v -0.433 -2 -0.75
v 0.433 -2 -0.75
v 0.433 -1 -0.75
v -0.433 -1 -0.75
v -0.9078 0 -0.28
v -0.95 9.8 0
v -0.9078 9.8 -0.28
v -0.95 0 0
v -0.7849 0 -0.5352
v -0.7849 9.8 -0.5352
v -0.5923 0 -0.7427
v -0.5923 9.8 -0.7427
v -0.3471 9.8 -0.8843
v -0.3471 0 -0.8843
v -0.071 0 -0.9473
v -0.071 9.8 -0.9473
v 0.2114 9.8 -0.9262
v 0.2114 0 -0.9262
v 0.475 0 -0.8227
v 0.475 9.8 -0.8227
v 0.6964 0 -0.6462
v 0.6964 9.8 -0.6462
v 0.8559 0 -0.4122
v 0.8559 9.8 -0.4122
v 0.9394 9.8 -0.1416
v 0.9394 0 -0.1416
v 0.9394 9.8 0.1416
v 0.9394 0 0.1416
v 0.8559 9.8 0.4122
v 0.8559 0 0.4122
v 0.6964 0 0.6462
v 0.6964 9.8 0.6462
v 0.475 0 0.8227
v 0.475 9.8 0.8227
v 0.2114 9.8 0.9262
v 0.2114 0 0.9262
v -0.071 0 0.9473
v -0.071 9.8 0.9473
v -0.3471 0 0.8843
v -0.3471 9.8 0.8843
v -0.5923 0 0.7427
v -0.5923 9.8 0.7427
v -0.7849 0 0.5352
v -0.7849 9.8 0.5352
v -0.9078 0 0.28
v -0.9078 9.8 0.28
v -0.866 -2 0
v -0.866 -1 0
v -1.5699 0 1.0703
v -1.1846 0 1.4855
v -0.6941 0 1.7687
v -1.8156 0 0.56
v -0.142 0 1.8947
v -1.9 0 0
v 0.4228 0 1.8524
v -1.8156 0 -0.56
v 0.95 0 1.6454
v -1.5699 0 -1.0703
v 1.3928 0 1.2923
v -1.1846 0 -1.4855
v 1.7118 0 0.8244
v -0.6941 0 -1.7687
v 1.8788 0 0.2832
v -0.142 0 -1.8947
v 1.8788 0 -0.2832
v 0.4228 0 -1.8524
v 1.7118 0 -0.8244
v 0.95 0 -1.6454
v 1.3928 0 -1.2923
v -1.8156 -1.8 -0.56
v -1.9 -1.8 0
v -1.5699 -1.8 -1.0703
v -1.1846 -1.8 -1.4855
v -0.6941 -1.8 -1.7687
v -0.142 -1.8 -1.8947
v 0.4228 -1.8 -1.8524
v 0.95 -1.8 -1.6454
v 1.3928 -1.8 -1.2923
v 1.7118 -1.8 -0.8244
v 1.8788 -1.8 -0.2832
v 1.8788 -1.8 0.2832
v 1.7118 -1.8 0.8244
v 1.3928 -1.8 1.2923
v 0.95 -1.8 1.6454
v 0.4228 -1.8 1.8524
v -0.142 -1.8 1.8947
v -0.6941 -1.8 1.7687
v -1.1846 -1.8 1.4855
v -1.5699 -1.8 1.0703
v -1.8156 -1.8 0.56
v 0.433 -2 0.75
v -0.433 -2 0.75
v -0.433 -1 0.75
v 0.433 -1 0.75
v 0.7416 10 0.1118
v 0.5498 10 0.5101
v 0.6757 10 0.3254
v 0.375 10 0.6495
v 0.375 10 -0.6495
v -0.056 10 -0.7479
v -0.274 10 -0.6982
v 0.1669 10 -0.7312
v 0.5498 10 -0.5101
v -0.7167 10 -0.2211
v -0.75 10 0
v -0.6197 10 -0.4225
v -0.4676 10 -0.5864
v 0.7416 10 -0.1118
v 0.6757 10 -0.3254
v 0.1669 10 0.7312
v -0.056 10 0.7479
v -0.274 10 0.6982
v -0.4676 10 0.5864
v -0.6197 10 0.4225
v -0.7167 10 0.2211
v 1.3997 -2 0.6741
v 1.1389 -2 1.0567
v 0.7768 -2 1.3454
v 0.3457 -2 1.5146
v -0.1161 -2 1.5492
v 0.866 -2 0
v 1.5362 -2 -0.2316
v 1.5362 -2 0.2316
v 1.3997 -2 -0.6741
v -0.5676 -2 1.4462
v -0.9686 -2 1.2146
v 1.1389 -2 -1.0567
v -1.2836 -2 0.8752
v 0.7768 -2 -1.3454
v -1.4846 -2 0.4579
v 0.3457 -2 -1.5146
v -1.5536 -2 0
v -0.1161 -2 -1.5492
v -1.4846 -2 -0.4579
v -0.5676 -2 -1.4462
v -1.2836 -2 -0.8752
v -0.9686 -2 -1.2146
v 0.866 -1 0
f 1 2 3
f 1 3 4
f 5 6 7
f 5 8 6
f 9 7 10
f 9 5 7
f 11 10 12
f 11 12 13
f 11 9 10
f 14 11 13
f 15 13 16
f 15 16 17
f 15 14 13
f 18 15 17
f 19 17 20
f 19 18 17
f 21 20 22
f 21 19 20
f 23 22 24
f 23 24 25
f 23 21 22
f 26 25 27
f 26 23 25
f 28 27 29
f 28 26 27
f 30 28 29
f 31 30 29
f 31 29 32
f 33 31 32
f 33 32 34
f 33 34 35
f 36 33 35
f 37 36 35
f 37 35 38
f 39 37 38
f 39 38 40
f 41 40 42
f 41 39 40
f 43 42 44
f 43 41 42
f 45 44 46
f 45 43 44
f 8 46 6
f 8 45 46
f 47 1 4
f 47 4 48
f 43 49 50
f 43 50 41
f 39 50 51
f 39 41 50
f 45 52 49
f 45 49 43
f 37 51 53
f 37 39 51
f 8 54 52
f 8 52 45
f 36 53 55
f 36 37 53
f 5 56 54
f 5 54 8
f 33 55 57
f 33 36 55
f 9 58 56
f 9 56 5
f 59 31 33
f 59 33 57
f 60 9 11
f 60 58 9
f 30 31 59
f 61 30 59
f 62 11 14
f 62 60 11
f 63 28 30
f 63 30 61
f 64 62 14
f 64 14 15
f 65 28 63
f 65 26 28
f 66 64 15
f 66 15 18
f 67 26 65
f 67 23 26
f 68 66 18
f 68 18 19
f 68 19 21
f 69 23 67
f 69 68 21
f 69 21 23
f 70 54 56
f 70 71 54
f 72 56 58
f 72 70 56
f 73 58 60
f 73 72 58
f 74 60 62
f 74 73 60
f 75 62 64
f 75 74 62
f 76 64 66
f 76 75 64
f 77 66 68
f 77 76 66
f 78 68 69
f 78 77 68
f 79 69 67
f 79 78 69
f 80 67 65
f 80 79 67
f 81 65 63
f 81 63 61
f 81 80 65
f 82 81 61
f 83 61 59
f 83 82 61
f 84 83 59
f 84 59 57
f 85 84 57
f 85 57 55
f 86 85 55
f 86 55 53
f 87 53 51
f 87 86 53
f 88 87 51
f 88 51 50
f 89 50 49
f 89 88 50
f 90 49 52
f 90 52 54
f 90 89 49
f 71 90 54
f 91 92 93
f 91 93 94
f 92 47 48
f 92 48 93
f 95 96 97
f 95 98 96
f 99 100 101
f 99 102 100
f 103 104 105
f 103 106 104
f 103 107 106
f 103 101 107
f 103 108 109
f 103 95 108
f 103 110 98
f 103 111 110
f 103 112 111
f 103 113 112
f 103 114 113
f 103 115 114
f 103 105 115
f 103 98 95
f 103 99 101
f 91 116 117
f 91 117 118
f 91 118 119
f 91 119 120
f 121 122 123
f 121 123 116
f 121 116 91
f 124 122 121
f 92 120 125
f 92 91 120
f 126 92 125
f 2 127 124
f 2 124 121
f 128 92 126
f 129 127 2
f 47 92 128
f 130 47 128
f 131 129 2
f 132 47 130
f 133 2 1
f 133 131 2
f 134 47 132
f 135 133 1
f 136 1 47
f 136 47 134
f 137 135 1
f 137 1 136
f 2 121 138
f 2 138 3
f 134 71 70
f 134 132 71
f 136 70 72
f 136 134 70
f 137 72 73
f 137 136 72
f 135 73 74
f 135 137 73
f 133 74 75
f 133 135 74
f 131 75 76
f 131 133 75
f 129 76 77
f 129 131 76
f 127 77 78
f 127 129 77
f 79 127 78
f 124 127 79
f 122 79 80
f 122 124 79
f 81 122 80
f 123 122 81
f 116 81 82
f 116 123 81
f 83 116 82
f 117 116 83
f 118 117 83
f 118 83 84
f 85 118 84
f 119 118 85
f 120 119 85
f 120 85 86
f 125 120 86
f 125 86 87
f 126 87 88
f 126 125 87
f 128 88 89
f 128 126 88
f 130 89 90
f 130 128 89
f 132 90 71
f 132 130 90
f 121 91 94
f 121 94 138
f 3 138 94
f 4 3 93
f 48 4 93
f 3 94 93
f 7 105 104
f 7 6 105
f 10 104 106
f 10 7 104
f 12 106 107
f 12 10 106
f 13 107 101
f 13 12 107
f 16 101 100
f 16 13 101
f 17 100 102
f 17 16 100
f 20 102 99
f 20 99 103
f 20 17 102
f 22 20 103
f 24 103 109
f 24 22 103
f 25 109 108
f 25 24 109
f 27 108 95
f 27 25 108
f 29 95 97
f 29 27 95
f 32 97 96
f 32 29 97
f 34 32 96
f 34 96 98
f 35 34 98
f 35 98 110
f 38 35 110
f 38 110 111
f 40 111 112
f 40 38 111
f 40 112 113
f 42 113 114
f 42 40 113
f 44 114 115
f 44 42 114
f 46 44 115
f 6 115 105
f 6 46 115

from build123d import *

# Parameters (mm, degrees)
CUT_EXTRUDE1_DEPTH = 1


with BuildPart() as part:
    # Sketch1 → Base-Revolve (revolve)
    with BuildSketch(Plane.XY, mode=Mode.PRIVATE) as base_revolve_sk:
        Polygon((0.95, 0), (1.9, 0), (1.9, -1.8), (1.553589838, -2), (0, -2), (0, 10), (0.75, 10), (0.95, 9.8), align=None)
    revolve(base_revolve_sk.sketch.rotate(Axis((0, -2, 0), (0, -1, 0)), 180), axis=Axis((0, -2, 0), (0, -1, 0)))

    # Sketch2 → Cut-Extrude1 (cut)
    with BuildSketch(Plane.XZ.offset(2)):
        Polygon((-0.433012702, 0.75), (0.433012702, 0.75), (0.866025404, 0), (0.433012702, -0.75), (-0.433012702, -0.75), (-0.866025404, 0), align=None)
    extrude(amount=-CUT_EXTRUDE1_DEPTH, mode=Mode.SUBTRACT)


solid = part.part
